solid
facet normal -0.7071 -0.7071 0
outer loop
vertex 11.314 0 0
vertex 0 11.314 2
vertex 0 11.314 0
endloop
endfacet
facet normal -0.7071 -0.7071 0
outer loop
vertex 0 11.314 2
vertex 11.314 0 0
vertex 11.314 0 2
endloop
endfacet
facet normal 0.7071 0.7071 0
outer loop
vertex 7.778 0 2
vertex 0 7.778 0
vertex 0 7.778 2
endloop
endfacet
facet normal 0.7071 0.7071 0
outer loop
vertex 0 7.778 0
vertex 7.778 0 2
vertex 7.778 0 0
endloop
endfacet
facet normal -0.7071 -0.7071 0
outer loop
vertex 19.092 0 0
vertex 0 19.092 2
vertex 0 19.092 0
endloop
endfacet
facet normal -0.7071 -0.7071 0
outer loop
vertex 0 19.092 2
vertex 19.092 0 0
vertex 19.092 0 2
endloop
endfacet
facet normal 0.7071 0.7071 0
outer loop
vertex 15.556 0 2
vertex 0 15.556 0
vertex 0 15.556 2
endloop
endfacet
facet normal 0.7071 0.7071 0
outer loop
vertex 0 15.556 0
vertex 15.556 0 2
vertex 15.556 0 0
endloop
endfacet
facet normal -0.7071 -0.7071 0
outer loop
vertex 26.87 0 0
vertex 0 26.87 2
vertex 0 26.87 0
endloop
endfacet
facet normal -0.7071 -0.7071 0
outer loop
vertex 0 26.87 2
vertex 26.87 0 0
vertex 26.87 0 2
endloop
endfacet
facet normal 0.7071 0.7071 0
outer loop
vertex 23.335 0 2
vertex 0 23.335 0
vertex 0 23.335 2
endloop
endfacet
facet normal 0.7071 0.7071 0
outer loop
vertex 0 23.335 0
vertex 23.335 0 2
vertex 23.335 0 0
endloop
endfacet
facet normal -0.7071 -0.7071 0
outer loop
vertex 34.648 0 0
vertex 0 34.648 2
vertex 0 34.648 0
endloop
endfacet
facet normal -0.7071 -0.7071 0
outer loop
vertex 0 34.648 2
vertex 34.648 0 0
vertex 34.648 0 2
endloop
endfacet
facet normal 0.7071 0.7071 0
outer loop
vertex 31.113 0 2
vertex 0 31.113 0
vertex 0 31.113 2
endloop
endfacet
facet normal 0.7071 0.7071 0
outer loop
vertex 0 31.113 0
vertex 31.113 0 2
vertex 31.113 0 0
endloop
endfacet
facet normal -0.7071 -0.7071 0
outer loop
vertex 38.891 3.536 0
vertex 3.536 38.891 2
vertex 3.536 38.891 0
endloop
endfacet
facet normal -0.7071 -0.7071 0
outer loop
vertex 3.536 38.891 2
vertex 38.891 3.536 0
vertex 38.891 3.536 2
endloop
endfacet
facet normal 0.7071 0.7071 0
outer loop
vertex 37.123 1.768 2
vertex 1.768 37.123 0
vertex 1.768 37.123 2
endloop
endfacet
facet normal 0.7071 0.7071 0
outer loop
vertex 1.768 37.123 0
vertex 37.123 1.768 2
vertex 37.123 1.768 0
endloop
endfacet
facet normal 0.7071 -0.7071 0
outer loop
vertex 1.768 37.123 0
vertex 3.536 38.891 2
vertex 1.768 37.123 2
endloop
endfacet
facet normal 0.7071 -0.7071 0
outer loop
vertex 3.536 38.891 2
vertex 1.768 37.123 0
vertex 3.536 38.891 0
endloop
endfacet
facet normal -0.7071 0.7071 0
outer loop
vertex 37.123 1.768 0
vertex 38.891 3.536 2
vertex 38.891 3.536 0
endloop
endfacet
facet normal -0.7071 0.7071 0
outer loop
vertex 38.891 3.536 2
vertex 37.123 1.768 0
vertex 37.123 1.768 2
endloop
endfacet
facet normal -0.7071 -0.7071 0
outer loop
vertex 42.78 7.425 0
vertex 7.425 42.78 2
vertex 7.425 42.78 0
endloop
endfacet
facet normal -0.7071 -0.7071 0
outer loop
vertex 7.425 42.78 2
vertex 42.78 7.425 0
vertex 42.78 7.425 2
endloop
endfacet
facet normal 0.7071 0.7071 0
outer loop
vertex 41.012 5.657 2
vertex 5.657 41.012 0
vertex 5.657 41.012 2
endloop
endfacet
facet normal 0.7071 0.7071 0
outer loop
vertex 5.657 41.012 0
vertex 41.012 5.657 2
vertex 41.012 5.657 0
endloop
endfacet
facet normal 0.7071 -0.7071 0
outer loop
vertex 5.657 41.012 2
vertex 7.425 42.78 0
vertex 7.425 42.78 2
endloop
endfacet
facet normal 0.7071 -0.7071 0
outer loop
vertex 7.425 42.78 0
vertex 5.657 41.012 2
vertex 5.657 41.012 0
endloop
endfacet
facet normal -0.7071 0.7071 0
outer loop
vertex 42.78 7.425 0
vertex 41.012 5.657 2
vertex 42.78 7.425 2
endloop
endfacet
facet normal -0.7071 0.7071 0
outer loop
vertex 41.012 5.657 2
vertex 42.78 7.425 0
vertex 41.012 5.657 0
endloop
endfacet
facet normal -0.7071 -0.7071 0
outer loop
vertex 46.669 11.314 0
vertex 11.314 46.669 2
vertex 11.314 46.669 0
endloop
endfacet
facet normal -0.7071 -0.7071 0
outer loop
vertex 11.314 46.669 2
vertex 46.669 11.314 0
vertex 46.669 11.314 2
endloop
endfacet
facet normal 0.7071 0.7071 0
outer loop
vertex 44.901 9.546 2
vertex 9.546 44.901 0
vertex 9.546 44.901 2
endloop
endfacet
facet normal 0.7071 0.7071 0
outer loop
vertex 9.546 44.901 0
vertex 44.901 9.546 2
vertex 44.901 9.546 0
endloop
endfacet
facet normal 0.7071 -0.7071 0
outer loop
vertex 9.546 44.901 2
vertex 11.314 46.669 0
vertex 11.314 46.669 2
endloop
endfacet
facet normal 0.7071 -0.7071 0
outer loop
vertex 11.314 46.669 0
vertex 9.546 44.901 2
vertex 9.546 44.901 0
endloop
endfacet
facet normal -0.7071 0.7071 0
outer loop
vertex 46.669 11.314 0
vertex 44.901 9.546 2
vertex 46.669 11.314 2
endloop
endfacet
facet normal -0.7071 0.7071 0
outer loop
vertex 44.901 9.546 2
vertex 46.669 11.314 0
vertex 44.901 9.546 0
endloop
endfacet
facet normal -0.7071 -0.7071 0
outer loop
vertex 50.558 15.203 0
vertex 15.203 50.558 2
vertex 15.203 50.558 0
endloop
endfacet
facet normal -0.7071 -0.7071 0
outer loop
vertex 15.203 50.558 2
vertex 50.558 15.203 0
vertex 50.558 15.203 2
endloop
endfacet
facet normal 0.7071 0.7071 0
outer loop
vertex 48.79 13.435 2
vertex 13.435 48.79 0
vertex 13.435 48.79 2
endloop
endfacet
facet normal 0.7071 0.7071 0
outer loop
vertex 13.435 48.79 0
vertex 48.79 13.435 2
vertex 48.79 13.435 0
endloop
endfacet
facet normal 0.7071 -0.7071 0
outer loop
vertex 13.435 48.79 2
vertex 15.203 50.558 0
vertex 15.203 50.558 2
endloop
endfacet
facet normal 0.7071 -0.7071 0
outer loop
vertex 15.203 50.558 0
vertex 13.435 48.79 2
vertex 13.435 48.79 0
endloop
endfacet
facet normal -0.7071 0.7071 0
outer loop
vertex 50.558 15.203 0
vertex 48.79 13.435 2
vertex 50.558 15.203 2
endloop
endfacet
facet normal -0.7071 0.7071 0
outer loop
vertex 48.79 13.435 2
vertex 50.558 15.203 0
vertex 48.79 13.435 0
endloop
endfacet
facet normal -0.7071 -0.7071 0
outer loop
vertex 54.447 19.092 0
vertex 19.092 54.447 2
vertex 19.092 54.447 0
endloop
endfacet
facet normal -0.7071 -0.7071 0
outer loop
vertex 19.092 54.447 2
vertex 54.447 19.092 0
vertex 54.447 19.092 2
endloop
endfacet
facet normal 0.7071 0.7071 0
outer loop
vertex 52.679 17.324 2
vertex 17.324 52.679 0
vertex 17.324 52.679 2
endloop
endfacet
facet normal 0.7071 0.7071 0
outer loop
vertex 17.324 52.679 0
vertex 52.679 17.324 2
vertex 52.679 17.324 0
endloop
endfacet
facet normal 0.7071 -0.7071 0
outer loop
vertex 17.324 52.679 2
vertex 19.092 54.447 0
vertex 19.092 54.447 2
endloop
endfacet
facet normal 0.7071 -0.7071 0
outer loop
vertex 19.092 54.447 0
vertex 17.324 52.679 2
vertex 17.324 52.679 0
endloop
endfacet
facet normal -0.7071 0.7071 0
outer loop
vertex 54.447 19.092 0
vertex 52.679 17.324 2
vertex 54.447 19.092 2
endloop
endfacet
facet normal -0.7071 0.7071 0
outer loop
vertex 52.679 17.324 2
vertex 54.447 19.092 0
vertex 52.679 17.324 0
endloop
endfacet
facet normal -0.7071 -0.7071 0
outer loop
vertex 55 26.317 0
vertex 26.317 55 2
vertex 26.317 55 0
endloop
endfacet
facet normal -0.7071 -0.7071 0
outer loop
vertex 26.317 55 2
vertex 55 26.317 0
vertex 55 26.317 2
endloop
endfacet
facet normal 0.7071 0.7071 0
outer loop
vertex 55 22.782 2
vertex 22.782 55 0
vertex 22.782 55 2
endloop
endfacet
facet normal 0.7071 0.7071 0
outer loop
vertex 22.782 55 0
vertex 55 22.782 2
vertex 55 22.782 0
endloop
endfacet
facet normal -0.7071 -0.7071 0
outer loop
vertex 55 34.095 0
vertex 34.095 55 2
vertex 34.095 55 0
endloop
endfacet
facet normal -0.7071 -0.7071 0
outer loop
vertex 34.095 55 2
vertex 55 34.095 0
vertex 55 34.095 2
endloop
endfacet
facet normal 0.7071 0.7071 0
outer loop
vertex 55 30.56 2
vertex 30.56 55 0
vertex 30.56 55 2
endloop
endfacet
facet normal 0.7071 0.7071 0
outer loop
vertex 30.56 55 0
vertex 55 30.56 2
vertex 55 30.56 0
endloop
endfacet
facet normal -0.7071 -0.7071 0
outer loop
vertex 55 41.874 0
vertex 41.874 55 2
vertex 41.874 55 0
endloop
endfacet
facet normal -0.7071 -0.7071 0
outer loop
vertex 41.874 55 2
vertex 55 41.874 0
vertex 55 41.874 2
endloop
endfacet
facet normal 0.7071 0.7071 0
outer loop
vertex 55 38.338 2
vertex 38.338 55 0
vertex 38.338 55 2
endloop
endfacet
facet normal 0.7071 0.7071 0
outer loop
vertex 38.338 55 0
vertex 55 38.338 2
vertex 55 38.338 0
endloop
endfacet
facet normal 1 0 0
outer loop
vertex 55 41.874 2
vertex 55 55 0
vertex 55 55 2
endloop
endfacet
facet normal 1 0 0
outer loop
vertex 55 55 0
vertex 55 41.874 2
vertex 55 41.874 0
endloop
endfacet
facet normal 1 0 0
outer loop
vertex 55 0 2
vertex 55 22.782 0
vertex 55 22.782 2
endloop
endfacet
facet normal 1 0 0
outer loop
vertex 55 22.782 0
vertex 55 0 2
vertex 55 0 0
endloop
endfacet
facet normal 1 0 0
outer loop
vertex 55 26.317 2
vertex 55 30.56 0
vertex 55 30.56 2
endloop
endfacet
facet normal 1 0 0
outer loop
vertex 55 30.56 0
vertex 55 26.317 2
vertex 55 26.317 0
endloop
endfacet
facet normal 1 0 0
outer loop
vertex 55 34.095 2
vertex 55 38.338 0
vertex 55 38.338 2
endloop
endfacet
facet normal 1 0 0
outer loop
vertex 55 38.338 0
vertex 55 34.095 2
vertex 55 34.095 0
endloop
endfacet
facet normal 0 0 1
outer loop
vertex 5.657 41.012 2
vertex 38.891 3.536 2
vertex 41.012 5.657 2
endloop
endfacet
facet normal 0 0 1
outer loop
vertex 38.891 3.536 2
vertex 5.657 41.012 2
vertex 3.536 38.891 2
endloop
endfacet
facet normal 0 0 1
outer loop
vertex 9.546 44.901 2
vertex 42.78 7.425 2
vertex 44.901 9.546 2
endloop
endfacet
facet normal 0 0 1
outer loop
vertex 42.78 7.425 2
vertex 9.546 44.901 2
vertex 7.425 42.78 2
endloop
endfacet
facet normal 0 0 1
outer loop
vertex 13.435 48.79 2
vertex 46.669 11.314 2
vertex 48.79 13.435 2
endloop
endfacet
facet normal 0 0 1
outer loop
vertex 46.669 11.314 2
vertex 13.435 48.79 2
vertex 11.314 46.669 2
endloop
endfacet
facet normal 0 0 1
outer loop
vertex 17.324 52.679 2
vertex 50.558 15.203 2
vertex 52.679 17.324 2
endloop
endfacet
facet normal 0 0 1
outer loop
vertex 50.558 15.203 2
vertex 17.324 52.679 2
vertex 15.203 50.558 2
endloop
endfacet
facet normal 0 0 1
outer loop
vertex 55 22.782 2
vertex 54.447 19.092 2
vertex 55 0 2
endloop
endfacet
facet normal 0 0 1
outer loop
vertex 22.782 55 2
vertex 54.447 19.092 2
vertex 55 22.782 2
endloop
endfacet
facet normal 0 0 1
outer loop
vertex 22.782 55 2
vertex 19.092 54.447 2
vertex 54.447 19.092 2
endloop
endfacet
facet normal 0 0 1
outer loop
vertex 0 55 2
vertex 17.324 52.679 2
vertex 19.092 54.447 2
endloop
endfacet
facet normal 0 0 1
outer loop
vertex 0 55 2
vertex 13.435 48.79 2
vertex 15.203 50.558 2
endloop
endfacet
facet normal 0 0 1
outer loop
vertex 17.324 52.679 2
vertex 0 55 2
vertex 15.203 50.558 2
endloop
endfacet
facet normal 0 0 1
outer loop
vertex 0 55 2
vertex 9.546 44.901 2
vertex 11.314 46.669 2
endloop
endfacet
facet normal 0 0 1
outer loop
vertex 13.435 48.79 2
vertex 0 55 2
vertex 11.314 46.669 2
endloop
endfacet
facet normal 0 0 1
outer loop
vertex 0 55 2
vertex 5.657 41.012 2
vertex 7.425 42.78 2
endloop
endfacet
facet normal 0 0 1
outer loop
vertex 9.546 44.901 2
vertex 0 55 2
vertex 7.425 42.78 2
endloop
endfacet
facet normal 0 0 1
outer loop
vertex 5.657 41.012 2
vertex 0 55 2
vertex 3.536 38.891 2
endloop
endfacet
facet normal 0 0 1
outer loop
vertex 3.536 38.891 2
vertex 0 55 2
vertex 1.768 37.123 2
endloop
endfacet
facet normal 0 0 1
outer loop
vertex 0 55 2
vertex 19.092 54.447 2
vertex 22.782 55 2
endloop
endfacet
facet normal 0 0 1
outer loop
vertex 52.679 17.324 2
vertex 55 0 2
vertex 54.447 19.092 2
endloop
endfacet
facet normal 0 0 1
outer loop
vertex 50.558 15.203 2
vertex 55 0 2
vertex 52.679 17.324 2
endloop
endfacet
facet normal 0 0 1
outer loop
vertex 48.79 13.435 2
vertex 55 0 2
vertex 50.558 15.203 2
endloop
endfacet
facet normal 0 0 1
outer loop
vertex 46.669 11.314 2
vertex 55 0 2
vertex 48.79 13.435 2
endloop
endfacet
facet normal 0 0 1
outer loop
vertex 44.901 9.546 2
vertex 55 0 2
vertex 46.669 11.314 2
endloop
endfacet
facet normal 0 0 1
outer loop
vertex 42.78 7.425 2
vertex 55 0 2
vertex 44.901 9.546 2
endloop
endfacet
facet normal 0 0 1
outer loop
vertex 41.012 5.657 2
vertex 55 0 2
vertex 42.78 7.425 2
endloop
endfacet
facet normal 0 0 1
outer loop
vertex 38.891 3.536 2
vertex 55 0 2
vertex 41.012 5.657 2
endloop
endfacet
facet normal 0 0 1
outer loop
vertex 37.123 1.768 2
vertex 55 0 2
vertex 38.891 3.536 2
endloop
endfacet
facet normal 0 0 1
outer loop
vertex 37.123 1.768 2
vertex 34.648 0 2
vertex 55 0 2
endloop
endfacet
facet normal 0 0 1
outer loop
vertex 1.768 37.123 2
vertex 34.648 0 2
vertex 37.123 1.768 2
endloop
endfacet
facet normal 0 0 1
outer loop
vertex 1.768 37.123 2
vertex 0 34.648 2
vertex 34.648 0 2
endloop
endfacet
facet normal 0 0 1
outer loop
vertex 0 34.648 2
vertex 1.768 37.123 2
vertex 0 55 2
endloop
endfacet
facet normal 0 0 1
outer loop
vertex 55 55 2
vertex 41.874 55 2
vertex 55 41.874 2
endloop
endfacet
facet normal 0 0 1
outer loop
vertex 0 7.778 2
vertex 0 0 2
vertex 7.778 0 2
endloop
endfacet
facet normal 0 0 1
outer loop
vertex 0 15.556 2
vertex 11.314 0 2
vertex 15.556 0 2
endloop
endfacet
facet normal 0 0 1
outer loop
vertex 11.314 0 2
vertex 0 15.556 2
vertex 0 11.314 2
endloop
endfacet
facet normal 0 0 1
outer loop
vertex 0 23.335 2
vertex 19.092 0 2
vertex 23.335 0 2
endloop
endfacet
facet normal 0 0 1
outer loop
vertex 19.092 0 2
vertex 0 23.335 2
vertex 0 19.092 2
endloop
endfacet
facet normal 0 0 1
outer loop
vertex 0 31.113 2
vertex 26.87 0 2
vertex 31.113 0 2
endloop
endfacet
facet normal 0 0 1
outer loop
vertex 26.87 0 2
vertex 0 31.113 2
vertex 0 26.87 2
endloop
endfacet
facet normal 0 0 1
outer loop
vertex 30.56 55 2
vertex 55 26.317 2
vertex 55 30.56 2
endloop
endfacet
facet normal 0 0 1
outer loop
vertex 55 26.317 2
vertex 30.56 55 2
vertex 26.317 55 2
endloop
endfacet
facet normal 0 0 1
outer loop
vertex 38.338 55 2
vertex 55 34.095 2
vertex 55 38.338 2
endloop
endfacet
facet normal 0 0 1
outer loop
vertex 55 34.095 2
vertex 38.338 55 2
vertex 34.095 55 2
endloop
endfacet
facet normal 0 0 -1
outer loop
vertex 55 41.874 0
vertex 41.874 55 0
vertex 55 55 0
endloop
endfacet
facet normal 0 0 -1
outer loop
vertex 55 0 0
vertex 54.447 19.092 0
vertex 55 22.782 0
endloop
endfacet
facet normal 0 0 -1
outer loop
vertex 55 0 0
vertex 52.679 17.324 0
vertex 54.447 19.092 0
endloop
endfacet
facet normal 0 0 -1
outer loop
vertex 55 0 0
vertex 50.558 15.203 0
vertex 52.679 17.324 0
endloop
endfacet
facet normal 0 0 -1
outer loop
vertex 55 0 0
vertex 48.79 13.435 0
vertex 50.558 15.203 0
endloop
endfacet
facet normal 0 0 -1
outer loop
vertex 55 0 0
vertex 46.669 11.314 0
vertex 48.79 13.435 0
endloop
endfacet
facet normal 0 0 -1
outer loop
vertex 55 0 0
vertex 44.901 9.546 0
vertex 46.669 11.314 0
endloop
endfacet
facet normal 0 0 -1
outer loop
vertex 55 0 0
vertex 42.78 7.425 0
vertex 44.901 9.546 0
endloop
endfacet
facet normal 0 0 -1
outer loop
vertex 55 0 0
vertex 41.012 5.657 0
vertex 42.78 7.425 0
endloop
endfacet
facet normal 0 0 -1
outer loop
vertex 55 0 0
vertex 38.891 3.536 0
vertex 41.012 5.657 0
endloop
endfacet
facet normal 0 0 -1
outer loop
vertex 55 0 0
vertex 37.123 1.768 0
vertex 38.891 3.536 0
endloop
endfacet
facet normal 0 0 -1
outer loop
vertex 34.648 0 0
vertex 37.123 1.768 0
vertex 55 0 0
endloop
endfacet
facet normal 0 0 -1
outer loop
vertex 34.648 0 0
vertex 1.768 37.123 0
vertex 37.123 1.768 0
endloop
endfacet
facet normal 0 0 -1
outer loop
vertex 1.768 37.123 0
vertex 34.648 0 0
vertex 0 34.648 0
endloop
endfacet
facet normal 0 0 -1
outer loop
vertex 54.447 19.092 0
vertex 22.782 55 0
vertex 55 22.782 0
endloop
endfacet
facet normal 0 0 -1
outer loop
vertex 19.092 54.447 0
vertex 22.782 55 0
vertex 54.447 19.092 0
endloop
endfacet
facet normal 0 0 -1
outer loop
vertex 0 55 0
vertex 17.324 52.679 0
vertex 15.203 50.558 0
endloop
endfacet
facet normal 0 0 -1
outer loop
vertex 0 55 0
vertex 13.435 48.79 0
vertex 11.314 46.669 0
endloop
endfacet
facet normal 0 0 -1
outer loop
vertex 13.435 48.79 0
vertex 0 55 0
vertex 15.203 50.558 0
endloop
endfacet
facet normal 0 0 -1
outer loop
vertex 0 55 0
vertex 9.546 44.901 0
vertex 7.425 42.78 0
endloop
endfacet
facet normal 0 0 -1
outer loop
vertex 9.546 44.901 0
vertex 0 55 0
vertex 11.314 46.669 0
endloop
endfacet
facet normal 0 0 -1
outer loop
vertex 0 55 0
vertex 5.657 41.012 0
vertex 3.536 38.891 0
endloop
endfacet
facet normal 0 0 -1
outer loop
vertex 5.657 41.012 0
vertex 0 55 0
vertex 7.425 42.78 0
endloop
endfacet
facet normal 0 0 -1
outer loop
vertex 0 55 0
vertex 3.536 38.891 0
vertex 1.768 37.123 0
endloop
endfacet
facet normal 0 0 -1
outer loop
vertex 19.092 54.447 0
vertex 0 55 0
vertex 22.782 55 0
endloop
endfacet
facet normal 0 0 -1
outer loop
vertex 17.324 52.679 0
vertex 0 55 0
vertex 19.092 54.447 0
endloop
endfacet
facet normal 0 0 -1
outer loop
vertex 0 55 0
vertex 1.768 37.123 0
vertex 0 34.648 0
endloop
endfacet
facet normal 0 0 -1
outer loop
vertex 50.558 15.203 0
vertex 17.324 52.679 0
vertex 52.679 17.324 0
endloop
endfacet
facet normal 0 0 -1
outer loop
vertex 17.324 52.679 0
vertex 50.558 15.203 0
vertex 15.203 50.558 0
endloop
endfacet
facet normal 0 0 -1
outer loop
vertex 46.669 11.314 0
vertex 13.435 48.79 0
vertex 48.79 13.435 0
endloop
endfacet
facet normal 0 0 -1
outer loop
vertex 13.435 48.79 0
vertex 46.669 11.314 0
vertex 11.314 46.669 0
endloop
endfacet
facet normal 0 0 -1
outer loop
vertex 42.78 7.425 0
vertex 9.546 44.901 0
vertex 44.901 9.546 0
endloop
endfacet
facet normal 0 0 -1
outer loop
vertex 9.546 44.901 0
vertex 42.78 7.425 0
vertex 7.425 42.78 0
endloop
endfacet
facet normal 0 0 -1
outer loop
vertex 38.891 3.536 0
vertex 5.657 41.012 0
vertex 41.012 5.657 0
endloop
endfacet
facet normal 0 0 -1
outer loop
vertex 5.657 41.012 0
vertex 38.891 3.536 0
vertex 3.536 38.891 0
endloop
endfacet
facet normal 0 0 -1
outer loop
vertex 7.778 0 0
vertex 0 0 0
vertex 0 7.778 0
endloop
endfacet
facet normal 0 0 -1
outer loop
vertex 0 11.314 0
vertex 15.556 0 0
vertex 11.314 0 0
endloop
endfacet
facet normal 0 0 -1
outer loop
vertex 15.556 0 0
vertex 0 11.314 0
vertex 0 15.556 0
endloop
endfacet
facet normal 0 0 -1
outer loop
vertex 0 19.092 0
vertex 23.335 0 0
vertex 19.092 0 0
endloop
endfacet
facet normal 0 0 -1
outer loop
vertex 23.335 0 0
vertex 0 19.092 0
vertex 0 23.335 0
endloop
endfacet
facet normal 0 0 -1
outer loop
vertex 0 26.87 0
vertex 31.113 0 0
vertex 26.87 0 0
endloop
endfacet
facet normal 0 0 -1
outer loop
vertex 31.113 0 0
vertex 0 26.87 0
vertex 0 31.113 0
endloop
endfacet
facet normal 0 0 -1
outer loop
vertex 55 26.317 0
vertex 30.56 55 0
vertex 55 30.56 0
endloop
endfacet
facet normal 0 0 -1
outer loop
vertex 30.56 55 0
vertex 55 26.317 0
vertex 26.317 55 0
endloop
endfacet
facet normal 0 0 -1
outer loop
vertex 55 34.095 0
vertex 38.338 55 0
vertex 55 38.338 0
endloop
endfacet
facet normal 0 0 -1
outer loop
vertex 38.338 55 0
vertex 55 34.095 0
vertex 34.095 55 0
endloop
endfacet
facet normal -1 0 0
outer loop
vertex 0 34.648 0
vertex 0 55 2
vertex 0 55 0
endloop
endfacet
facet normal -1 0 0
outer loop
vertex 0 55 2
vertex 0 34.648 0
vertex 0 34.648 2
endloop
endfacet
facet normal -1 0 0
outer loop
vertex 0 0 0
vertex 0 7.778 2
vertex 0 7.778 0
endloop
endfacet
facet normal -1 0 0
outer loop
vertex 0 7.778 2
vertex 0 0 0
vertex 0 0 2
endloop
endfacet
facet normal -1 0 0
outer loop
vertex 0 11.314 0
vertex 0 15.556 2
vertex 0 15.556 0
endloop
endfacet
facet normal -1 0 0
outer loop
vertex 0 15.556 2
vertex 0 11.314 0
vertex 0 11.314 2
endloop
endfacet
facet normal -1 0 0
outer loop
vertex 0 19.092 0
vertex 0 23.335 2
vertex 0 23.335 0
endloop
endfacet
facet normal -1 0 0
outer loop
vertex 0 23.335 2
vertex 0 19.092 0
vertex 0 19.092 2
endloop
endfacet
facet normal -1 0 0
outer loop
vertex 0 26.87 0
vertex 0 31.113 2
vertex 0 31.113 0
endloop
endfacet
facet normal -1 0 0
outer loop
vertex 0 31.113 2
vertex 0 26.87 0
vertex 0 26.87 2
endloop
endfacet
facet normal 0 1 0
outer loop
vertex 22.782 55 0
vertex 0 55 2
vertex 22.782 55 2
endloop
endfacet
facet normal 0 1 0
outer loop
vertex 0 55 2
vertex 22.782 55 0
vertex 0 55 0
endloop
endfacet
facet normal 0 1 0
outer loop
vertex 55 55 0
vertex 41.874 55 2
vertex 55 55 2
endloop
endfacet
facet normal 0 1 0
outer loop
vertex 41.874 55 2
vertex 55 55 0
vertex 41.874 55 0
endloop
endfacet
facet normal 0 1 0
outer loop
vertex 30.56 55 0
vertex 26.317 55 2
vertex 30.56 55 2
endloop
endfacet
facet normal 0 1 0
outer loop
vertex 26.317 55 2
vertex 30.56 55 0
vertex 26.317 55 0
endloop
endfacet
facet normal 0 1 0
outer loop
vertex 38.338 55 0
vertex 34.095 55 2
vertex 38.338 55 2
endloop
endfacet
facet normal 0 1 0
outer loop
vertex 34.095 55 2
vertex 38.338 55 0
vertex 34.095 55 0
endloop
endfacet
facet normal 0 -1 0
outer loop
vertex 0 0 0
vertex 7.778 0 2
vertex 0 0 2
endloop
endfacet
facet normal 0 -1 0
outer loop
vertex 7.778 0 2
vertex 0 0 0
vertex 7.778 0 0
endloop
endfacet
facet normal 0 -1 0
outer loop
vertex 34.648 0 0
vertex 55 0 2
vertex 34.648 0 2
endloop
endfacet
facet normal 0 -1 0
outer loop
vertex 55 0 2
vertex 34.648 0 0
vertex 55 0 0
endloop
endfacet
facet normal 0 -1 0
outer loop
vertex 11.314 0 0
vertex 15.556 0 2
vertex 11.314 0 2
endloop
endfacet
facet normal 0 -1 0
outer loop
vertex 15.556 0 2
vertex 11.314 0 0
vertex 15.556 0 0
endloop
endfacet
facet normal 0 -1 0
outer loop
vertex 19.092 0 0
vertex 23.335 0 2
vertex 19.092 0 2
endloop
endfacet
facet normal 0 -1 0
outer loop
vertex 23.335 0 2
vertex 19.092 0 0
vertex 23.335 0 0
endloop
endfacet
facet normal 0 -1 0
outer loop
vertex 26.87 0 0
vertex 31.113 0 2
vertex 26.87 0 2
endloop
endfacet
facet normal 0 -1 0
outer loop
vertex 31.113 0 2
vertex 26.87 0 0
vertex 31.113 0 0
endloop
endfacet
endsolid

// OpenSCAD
w = 55;
h = 55;
d = 2;

hw=2.5;
hw_gap=3;
count=w / (hw + hw_gap);

difference(){
cube([w, h, d]);
rotate([0, 0 , 45]) {  
for(i = [1:count+2]){
    color("green")
    translate([i*(hw+hw_gap),-25, -1])
    cube([hw,h-5,d+2]);
}
}
}
